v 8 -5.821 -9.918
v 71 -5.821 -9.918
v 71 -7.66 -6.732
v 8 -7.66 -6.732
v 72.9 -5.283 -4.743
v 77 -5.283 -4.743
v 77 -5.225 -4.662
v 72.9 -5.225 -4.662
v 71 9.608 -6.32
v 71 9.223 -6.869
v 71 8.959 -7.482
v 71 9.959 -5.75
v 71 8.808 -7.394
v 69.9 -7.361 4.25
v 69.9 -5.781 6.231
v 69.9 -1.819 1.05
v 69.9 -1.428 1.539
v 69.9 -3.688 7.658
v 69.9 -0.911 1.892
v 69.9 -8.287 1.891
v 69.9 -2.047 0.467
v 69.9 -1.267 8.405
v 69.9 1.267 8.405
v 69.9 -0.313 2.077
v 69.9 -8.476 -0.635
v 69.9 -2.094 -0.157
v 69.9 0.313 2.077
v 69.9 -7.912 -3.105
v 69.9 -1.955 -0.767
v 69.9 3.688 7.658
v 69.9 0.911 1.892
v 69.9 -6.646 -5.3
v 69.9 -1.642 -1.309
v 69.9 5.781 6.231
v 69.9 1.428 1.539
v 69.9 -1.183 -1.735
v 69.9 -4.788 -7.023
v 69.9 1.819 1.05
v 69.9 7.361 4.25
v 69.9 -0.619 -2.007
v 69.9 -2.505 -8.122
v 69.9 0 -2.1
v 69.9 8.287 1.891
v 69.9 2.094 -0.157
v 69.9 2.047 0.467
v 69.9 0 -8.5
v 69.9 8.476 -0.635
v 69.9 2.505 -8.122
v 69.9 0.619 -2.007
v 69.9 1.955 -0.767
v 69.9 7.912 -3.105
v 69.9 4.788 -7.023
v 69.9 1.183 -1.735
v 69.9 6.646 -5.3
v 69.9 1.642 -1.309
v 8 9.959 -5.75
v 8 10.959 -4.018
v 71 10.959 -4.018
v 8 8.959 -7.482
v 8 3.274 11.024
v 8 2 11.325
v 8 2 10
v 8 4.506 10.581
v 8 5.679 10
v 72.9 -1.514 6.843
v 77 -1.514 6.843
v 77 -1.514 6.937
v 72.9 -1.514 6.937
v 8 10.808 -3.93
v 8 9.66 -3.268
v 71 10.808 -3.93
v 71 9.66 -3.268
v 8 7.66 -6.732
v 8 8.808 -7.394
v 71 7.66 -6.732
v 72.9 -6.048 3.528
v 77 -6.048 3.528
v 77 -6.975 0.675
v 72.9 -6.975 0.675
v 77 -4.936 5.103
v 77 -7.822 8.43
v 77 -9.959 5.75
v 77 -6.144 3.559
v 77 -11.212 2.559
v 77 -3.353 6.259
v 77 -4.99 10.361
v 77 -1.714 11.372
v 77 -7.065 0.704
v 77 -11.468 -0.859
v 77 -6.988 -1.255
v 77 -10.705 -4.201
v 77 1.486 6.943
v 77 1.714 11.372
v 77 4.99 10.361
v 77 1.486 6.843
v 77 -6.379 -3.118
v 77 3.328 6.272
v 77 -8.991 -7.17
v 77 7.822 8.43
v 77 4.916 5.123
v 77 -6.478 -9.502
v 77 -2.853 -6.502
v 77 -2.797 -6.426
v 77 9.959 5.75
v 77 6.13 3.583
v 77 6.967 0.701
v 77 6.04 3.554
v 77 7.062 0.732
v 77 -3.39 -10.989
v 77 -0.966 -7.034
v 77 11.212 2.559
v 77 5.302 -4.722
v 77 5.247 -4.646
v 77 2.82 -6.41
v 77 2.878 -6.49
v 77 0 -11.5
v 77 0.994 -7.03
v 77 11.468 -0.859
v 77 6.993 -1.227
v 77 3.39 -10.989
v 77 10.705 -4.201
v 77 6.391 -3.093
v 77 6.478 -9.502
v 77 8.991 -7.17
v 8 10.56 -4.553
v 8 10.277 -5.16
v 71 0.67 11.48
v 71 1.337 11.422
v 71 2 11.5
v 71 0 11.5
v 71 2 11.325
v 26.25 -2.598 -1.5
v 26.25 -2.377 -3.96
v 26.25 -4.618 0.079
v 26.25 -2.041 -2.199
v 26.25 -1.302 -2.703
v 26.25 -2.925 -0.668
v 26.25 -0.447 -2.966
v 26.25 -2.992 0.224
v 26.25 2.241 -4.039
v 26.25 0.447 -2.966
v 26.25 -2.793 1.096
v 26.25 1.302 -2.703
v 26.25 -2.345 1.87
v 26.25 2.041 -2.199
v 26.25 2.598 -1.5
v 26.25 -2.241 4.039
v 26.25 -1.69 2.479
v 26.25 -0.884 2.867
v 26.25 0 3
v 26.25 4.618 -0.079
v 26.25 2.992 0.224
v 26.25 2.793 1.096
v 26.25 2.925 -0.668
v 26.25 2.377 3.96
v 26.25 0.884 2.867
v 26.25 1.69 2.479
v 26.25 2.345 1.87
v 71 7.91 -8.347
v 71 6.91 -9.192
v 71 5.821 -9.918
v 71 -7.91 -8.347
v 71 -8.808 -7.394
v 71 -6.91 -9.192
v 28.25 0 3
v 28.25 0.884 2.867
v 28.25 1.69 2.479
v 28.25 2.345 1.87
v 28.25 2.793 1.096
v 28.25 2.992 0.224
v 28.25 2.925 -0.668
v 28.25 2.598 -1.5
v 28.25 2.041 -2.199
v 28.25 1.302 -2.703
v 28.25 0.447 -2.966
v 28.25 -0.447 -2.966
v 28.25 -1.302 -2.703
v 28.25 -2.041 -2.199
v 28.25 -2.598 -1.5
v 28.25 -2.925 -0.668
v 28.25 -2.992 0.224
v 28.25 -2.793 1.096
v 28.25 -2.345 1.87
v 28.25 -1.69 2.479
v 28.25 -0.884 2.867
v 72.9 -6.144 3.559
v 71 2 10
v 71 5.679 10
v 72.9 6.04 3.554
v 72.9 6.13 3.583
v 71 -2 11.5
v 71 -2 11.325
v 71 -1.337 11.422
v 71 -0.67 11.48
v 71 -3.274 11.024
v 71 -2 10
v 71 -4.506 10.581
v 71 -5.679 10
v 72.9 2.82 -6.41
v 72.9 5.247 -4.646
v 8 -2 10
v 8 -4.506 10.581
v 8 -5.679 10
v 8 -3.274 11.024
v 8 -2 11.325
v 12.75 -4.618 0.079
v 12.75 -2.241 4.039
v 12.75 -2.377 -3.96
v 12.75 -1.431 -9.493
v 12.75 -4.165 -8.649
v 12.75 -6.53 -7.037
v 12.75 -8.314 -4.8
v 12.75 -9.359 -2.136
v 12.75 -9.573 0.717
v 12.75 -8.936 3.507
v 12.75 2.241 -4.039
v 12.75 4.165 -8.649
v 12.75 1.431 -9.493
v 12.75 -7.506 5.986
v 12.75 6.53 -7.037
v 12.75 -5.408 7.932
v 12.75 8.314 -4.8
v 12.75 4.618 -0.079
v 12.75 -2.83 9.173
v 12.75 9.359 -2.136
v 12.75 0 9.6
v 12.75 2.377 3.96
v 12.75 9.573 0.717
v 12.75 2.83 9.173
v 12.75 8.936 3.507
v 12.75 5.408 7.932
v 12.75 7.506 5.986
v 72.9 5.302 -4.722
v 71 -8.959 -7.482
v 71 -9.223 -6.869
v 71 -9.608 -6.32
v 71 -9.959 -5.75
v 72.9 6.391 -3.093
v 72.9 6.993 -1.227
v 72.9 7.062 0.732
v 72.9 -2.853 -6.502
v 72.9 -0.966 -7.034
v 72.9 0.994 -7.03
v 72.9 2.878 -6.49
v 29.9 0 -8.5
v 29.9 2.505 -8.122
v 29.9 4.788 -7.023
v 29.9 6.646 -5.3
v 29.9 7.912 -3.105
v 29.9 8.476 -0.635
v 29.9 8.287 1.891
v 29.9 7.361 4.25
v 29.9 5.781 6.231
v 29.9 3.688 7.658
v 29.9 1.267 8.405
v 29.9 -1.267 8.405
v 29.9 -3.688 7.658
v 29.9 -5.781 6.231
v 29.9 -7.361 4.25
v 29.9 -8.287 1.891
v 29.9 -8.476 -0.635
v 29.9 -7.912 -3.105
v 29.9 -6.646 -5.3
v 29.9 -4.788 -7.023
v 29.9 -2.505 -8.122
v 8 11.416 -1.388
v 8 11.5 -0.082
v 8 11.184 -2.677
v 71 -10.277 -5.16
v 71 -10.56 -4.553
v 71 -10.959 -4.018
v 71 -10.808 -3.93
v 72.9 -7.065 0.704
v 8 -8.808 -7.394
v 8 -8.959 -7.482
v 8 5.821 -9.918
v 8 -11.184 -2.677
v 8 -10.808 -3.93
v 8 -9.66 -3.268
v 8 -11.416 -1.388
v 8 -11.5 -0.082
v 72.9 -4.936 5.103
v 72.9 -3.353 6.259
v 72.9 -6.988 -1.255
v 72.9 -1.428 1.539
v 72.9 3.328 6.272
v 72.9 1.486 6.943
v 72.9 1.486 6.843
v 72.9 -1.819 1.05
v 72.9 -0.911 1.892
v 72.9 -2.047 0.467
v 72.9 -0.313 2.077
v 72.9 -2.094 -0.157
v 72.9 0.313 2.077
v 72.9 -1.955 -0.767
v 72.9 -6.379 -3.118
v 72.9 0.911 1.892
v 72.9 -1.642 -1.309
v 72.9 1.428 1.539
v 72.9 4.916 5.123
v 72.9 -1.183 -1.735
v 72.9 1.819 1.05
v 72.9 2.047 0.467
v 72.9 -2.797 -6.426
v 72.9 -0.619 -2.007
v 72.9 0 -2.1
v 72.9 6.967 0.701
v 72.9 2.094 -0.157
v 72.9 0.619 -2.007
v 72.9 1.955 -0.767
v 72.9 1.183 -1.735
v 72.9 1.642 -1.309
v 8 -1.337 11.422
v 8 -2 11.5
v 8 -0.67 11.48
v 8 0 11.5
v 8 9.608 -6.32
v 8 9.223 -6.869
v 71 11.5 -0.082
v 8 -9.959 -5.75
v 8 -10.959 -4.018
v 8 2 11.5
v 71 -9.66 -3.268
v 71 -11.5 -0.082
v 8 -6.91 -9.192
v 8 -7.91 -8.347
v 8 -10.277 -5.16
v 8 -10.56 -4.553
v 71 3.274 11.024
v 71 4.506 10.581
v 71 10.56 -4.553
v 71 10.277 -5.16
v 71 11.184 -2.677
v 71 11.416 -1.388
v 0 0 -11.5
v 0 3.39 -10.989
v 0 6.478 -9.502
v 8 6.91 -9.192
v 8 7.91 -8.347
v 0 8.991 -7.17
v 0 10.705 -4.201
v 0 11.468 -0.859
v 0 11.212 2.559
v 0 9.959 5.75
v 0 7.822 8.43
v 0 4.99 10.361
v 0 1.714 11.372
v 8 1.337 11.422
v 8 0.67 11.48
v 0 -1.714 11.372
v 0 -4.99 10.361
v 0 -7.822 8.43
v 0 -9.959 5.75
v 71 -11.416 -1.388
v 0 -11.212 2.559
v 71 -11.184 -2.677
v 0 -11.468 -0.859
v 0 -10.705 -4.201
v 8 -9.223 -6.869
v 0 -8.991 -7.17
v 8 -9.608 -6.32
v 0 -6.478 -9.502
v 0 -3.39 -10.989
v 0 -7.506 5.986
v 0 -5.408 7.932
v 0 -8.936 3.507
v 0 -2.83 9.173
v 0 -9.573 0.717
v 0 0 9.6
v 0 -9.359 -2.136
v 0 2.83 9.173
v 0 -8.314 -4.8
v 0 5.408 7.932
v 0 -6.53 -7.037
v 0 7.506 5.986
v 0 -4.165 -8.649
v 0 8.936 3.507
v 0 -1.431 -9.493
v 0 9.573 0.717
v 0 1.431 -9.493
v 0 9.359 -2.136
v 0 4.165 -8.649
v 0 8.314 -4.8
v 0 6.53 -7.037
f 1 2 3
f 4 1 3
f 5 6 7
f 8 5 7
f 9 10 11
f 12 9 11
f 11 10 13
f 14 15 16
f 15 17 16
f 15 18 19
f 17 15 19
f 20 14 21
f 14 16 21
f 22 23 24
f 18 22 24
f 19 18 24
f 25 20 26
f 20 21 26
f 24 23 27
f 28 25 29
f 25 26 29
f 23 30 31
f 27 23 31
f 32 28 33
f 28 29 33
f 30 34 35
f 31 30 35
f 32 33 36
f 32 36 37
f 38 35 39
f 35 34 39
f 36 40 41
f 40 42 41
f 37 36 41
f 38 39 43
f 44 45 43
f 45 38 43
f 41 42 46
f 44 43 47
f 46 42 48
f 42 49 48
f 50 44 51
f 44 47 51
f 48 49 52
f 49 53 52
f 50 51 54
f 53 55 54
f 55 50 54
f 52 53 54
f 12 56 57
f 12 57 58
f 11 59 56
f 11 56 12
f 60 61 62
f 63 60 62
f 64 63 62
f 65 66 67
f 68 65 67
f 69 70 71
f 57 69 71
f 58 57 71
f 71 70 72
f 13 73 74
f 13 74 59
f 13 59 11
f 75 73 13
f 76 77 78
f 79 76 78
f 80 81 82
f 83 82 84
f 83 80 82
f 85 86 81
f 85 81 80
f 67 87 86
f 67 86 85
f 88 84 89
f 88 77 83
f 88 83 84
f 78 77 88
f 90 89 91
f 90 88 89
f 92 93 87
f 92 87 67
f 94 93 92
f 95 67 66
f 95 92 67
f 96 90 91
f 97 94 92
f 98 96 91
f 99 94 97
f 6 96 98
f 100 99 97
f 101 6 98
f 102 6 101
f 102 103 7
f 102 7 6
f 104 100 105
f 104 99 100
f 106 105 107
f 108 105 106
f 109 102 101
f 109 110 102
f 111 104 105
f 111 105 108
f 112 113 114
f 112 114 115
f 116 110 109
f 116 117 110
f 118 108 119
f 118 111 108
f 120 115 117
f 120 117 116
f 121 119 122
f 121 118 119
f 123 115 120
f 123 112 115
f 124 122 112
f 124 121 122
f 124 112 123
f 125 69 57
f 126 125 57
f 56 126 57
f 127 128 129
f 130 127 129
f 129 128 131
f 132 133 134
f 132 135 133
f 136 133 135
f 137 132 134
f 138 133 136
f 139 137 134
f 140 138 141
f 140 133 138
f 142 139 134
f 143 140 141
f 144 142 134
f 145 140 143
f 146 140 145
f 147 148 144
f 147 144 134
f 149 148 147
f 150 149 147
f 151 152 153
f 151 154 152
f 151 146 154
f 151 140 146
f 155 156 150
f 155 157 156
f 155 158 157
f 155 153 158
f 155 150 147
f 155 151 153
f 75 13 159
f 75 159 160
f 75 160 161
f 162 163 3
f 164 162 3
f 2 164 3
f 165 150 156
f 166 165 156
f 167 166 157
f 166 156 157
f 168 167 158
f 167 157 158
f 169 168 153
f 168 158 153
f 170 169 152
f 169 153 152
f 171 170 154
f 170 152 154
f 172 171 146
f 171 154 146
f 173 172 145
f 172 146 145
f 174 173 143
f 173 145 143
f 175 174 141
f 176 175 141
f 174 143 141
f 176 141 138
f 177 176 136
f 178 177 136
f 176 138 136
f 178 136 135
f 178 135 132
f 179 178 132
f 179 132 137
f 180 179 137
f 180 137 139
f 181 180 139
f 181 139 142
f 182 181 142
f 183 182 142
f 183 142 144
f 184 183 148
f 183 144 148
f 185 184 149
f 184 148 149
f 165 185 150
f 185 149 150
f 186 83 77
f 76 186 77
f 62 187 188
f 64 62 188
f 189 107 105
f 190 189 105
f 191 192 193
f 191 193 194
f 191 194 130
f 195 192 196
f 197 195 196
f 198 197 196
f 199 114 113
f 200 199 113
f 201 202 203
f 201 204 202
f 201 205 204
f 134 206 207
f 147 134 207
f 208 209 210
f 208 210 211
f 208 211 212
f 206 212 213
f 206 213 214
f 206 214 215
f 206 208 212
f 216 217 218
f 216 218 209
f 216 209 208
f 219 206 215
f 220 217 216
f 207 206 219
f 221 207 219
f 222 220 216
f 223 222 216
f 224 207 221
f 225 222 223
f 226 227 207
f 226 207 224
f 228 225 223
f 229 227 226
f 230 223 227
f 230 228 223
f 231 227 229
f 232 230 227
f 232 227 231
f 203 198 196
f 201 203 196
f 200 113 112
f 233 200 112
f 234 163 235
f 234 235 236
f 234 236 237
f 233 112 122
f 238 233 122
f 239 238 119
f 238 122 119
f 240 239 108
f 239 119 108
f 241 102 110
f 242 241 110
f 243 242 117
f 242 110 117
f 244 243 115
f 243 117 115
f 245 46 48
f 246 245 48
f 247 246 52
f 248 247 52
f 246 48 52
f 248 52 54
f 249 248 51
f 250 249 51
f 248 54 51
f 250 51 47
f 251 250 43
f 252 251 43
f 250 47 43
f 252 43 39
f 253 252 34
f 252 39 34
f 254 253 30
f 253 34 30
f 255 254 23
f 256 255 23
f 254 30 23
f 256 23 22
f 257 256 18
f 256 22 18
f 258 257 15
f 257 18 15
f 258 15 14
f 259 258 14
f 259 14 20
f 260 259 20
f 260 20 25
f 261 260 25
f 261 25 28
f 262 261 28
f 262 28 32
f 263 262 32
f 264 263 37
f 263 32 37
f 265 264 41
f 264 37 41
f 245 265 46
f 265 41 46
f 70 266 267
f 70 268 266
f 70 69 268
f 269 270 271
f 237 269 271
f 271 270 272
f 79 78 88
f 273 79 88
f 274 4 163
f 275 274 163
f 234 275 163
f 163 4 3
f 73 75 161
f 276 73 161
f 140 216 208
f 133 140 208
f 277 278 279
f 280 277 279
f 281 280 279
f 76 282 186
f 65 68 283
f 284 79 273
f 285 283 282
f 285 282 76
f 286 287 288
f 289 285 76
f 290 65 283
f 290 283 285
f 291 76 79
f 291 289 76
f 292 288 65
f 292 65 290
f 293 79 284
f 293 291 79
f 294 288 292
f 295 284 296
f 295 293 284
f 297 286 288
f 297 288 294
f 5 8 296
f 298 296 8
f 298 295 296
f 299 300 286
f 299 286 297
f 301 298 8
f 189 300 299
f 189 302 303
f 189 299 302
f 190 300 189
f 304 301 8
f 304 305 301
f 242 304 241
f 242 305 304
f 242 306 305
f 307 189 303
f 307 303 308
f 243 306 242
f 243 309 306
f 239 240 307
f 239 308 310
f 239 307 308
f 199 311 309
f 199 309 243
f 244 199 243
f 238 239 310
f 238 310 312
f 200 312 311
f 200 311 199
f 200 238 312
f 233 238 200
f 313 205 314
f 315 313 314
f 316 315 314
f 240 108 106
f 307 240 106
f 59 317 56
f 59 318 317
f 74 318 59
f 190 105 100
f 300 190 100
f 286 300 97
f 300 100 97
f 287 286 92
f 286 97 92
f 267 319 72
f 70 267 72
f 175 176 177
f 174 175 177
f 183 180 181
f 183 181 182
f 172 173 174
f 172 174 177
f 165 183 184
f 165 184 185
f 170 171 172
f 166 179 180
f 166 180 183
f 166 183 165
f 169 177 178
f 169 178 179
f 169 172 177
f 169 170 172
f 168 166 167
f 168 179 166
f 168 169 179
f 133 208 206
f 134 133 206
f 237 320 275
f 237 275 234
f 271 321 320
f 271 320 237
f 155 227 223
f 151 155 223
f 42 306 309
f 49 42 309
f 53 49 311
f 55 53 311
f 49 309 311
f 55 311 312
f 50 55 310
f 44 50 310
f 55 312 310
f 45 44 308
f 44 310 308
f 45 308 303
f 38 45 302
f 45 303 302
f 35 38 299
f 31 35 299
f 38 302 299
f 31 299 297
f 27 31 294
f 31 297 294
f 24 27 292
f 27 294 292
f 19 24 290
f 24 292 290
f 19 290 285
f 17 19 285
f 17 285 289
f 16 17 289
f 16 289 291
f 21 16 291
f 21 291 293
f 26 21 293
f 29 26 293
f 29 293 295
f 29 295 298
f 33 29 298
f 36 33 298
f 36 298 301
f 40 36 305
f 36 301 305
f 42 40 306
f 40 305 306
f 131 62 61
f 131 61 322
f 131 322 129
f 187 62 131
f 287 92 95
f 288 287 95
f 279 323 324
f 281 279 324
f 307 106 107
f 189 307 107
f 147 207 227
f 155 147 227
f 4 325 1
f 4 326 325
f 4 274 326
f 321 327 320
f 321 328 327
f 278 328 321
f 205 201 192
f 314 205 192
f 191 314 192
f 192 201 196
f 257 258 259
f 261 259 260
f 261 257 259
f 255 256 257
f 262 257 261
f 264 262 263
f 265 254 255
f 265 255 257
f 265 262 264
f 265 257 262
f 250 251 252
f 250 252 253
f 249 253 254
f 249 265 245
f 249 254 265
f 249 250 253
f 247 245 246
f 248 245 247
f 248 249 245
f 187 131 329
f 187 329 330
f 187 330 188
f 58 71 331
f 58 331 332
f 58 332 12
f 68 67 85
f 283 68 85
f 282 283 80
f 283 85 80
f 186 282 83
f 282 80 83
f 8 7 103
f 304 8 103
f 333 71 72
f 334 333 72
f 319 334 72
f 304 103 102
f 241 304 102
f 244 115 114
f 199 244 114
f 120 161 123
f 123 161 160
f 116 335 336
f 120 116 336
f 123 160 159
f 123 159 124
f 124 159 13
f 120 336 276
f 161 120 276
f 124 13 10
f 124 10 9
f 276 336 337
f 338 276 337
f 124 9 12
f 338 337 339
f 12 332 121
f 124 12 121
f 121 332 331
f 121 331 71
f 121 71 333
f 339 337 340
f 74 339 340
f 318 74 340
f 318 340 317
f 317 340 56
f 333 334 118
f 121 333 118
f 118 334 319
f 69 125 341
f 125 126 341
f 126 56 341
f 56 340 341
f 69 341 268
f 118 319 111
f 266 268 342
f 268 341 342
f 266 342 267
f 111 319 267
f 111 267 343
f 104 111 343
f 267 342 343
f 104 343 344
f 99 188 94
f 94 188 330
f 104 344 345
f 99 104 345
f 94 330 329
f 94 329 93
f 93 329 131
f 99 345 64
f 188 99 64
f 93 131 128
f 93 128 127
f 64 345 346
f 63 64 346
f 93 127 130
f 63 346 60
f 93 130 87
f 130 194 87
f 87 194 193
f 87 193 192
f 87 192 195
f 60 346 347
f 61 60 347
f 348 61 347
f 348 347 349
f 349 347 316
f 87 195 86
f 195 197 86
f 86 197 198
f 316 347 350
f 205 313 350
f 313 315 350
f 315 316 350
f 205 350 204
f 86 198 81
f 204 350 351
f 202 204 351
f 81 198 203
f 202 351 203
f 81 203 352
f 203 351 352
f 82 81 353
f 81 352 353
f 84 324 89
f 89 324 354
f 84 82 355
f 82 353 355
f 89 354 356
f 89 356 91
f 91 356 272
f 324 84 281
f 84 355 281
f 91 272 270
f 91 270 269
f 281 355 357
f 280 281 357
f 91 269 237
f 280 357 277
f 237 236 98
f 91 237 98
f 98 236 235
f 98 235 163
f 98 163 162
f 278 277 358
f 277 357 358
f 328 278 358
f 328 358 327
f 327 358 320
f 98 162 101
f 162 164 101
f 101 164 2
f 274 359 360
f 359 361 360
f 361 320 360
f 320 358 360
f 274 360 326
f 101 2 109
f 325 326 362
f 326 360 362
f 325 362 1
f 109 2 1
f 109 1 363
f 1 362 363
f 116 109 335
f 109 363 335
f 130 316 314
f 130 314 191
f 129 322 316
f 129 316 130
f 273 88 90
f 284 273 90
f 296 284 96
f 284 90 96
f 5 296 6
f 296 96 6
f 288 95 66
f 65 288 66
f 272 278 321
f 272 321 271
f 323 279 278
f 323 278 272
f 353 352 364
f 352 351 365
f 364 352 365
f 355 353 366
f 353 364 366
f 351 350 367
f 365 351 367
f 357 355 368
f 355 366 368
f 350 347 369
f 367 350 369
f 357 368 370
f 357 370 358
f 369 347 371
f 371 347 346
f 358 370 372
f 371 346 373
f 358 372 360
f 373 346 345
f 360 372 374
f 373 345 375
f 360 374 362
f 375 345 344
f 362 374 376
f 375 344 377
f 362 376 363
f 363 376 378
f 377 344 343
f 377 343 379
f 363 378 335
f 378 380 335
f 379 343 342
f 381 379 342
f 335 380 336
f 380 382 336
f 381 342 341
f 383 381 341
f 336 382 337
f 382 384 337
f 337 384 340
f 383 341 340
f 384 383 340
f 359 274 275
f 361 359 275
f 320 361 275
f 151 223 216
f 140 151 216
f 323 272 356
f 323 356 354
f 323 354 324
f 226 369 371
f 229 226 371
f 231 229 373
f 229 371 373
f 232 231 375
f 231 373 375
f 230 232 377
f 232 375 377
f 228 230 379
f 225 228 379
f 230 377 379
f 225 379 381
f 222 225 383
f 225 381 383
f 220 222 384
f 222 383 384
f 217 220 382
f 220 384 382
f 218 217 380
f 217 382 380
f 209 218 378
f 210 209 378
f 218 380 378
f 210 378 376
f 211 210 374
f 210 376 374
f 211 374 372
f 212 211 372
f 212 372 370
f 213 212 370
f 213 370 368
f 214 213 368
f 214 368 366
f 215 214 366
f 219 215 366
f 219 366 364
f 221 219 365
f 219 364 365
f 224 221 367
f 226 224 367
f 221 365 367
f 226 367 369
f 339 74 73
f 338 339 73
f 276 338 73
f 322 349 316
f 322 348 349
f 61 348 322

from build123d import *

# Parameters (mm, degrees)
SKIZZE1_R                       = 11.5
AUFSATZ_LINEAR_AUSTRAGEN1_DEPTH = 77
SCHNITT_LINEAR_AUSTRAGEN1_DEPTH = 4.1
SKIZZE3_R                       = 2.1
SCHNITT_LINEAR_AUSTRAGEN2_DEPTH = 3
SKIZZE4_R                       = 9.6
SCHNITT_LINEAR_AUSTRAGEN3_DEPTH = 12.75
SCHNITT_LINEAR_START            = -6
SKIZZE7_W                       = 1.5
SKIZZE7_H                       = 15
SCHNITT_LINEAR_AUSTRAGEN4_DEPTH = 63
SKIZZE8_W                       = 63
SKIZZE8_H                       = 4
AUFSATZ_LINEAR_AUSTRAGEN2_DEPTH = 1.5
SCHNITT_LINEAR_AUSTRAGEN6_DEPTH = 13.5
SKIZZE12_R                      = 3
SCHNITT_LINEAR_AUSTRAGEN7_DEPTH = 2
KREISMUSTER3_COUNT              = 3
SKIZZE13_R                      = 8.5
SCHNITT_LINEAR_AUSTRAGEN8_DEPTH = 40


with BuildPart() as part:
    # Skizze1 → Aufsatz-Linear austragen1 (new body)
    with BuildSketch(Plane(origin=(0, 0, 0), x_dir=(0, 0, -1), z_dir=(1, 0, 0))):
        Circle(SKIZZE1_R)
    extrude(amount=AUFSATZ_LINEAR_AUSTRAGEN1_DEPTH)

    # Skizze2 → Schnitt-Linear austragen1 (cut)
    with BuildSketch(Plane(origin=(77, 0, 0), x_dir=(0, 0, -1), z_dir=(1, 0, 0))):
        with BuildLine():
            Line((-6.942668977, 1.486387391), (-6.842668977, 1.486387391))
            Line((-6.842668977, 1.486387391), (-6.842668977, -1.513612609))
            Line((-6.842668977, -1.513612609), (-6.936784332, -1.513612609))
            ThreePointArc((-6.936784332, -1.513612609), (-5.735823545, -4.184534414), (-3.559041115, -6.143551607))
            Line((-3.559041115, -6.143551607), (-3.528139415, -6.048445955))
            Line((-3.528139415, -6.048445955), (-0.674969866, -6.975496938))
            Line((-0.674969866, -6.975496938), (-0.70405311, -7.06500596))
            ThreePointArc((-0.70405311, -7.06500596), (2.207261771, -6.748184606), (4.743060601, -5.283311096))
            Line((4.743060601, -5.283311096), (4.662158901, -5.224532571))
            Line((4.662158901, -5.224532571), (6.425514658, -2.797481588))
            Line((6.425514658, -2.797481588), (6.50165558, -2.852801206))
            ThreePointArc((6.50165558, -2.852801206), (7.099986341, 0.013926966), (6.490413777, 2.878285776))
            Line((6.490413777, 2.878285776), (6.409512077, 2.819507251))
            Line((6.409512077, 2.819507251), (4.64615632, 5.246558234))
            Line((4.64615632, 5.246558234), (4.722297242, 5.301877852))
            ThreePointArc((4.722297242, 5.301877852), (2.180771108, 6.756791944), (-0.731764286, 7.062189535))
            Line((-0.731764286, 7.062189535), (-0.700862586, 6.967083883))
            Line((-0.700862586, 6.967083883), (-3.554032135, 6.0400329))
            Line((-3.554032135, 6.0400329), (-3.583115379, 6.129541922))
            ThreePointArc((-3.583115379, 6.129541922), (-5.752195675, 4.162000111), (-6.942668977, 1.486387391))
        make_face()
    extrude(amount=-SCHNITT_LINEAR_AUSTRAGEN1_DEPTH, mode=Mode.SUBTRACT)

    # Skizze3 → Schnitt-Linear austragen2 (cut)
    with BuildSketch(Plane(origin=(72.9, 0, 0), x_dir=(0, 0, -1), z_dir=(1, 0, 0))):
        Circle(SKIZZE3_R)
    extrude(amount=-SCHNITT_LINEAR_AUSTRAGEN2_DEPTH, mode=Mode.SUBTRACT)

    # Skizze4 → Schnitt-Linear austragen3 (cut)
    with BuildSketch(Plane.ZY):
        Circle(SKIZZE4_R)
    extrude(amount=-SCHNITT_LINEAR_AUSTRAGEN3_DEPTH, mode=Mode.SUBTRACT)

    # Skizze7 → Schnitt-Linear austragen4 (cut)
    with BuildSketch(Plane(origin=(77, 0, 0), x_dir=(0, 0, -1), z_dir=(1, 0, 0)).offset(SCHNITT_LINEAR_START)):
        with Locations((-10.75, 0)):
            Rectangle(SKIZZE7_W, SKIZZE7_H)
    schnitt_linear_austragen4 = extrude(amount=-SCHNITT_LINEAR_AUSTRAGEN4_DEPTH, mode=Mode.SUBTRACT)

    # Skizze8 → Aufsatz-Linear austragen2 (add)
    with BuildSketch(Plane.XY.offset(10)):
        with Locations((39.5, 0)):
            Rectangle(SKIZZE8_W, SKIZZE8_H)
    aufsatz_linear_austragen2 = extrude(amount=AUFSATZ_LINEAR_AUSTRAGEN2_DEPTH)

    # Skizze10 → Schnitt-Linear austragen6 (cut)
    with BuildSketch(Plane.ZY.offset(-12.75)):
        Polygon((4.038863706, -2.240739453), (3.959969143, 2.377388845), (-0.078894563, 4.618128298), (-4.038863706, 2.240739453), (-3.959969143, -2.377388845), (0.078894563, -4.618128298), align=None)
    extrude(amount=-SCHNITT_LINEAR_AUSTRAGEN6_DEPTH, mode=Mode.SUBTRACT)

    # Skizze12 → Schnitt-Linear austragen7 (cut)
    with BuildSketch(Plane.ZY.offset(-26.25)):
        Circle(SKIZZE12_R)
    extrude(amount=-SCHNITT_LINEAR_AUSTRAGEN7_DEPTH, mode=Mode.SUBTRACT)

    # Kreismuster3: Schnitt-Linear austragen4, Aufsatz-Linear austragen2 ×3 about axis
    kreismuster3_axis = Axis((0, 0, 0), (1, 0, 0))
    add([schnitt_linear_austragen4.rotate(kreismuster3_axis, i * 360 / KREISMUSTER3_COUNT) for i in range(1, KREISMUSTER3_COUNT)], mode=Mode.SUBTRACT)
    add([aufsatz_linear_austragen2.rotate(kreismuster3_axis, i * 360 / KREISMUSTER3_COUNT) for i in range(1, KREISMUSTER3_COUNT)])

    # Skizze13 → Schnitt-Linear austragen8 (cut)
    with BuildSketch(Plane(origin=(69.9, 0, 0), x_dir=(0, 0, -1), z_dir=(1, 0, 0))):
        Circle(SKIZZE13_R)
    extrude(amount=-SCHNITT_LINEAR_AUSTRAGEN8_DEPTH, mode=Mode.SUBTRACT)


solid = part.part
